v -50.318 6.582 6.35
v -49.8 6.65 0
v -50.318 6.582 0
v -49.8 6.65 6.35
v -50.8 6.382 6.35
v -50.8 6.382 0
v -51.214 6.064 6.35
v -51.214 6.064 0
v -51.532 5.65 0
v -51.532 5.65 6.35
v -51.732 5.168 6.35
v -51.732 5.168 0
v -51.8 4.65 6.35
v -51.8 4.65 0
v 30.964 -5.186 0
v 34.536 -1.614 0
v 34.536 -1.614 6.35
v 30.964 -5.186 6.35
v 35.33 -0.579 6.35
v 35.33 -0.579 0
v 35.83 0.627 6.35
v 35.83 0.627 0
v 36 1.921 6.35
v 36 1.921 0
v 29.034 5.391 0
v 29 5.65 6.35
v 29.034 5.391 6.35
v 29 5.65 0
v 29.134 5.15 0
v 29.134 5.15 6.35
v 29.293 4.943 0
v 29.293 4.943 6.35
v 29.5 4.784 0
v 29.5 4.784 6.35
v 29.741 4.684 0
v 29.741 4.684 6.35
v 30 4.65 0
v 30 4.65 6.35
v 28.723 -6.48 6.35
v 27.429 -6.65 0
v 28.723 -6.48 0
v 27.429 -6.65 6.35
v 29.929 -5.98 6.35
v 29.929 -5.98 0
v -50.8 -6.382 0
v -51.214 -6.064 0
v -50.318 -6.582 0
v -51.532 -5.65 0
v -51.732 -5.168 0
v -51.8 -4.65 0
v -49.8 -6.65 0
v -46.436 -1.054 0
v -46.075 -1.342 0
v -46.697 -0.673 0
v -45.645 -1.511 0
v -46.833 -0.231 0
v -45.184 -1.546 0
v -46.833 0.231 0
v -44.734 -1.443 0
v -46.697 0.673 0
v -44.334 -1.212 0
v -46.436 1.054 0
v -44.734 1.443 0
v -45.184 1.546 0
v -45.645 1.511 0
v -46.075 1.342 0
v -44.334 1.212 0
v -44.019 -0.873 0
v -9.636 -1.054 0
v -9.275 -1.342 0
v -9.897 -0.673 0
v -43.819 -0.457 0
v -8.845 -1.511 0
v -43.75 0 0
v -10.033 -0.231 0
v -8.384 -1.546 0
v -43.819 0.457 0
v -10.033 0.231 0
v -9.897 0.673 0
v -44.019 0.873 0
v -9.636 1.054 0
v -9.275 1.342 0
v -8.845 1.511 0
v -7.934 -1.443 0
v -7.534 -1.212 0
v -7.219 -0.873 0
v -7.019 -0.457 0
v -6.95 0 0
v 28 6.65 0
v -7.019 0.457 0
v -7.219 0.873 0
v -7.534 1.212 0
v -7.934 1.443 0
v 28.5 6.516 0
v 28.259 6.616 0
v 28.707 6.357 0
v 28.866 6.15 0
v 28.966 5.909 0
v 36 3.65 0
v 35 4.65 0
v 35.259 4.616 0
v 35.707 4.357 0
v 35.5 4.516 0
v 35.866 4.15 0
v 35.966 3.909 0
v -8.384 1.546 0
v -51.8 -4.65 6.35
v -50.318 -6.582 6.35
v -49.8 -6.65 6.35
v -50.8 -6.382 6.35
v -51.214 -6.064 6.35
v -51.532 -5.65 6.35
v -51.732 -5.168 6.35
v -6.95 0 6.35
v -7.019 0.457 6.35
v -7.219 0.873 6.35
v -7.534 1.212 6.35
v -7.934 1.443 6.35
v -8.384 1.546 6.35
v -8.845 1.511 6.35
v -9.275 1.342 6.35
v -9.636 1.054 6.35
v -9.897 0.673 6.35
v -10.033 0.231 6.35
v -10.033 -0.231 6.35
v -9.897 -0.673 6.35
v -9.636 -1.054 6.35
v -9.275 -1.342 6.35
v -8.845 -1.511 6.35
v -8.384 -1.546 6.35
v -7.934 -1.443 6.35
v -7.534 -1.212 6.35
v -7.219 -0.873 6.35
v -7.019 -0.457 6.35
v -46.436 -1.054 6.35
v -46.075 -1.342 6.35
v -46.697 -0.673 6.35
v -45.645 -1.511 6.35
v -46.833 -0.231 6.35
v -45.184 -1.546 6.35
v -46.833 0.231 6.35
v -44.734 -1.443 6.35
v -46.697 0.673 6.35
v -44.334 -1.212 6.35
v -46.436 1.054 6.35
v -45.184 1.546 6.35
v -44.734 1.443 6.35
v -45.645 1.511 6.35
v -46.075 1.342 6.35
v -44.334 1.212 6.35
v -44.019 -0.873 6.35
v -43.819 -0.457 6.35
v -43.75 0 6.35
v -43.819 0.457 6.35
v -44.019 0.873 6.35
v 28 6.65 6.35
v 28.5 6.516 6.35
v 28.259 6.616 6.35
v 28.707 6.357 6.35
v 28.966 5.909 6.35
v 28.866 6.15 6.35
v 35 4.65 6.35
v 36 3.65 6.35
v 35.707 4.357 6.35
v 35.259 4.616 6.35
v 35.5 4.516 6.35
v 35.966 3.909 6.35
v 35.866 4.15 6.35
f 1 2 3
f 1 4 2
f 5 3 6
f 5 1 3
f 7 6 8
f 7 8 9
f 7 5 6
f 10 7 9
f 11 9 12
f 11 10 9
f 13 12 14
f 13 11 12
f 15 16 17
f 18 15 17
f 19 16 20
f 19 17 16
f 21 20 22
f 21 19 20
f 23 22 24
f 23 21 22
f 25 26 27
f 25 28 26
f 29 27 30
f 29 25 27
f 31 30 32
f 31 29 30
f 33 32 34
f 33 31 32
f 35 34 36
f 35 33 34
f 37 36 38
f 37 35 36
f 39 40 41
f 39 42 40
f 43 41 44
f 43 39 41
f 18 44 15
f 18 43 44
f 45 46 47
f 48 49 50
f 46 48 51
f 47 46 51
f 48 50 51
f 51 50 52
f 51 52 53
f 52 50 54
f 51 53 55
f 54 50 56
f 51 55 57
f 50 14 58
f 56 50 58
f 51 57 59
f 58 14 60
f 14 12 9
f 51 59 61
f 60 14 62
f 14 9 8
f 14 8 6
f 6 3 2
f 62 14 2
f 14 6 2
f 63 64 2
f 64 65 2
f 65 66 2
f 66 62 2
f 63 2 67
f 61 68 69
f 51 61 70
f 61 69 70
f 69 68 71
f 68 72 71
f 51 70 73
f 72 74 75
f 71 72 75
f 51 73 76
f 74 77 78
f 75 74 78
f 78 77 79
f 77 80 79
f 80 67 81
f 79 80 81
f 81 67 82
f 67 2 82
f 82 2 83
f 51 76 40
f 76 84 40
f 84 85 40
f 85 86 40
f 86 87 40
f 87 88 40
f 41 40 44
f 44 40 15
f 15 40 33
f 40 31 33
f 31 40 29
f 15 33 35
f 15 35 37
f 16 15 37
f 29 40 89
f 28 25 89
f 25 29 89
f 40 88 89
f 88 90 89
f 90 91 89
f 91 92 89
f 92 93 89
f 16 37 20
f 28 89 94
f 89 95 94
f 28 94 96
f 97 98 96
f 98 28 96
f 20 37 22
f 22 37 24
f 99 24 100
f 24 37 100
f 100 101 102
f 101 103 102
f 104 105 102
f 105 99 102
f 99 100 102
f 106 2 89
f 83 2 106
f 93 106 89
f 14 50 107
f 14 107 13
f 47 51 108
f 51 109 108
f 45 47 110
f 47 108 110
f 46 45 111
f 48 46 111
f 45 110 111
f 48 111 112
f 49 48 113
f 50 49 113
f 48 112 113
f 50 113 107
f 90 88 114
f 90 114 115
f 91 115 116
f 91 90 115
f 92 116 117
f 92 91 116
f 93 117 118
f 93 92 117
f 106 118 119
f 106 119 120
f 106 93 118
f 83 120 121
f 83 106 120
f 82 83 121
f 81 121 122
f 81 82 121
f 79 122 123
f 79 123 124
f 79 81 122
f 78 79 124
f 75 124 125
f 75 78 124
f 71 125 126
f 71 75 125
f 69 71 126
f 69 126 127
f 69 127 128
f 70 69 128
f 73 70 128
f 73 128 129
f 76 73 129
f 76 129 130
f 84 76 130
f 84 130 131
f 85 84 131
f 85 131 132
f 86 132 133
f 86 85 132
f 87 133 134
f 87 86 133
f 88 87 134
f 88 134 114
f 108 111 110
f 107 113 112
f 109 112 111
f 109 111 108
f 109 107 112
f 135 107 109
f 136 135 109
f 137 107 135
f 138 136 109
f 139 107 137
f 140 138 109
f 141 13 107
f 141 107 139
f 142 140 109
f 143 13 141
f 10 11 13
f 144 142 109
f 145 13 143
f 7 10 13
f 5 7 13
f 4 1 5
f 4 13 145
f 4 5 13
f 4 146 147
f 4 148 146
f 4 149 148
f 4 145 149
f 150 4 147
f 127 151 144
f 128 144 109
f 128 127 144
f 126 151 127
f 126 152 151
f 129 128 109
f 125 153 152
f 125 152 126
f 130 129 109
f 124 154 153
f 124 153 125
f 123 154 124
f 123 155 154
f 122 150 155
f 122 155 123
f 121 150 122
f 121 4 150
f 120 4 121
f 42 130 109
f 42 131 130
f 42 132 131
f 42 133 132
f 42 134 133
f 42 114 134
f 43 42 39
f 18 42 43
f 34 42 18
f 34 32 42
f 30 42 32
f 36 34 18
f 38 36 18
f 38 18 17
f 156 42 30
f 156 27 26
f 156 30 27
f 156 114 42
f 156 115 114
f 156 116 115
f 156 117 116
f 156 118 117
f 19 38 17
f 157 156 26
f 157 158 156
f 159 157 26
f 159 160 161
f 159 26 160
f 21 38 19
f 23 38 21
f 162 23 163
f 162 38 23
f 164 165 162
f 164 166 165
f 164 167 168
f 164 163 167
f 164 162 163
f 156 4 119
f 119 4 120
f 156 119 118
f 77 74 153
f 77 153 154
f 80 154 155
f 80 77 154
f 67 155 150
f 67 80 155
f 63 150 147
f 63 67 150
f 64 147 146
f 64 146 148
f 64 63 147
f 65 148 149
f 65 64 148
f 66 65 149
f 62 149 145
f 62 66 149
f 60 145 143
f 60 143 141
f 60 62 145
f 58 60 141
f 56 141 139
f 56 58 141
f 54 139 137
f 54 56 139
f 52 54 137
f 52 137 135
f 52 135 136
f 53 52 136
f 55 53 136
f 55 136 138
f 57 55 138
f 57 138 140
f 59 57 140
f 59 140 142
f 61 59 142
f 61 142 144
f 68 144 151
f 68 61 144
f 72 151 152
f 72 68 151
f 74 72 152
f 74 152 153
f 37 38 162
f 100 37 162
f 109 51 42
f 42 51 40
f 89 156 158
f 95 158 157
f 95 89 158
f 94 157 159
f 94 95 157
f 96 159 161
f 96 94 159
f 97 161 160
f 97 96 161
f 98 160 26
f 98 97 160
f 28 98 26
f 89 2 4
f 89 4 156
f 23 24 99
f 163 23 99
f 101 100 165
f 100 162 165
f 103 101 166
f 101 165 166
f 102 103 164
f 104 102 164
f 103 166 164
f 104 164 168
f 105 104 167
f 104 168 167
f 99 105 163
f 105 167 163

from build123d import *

# Parameters (mm, degrees)
SKETCH1_W           = 13.3
SKETCH1_H           = 13.3
SKETCH1_R           = 1.55
SKETCH1_W_2         = 74.5
BOSS_EXTRUDE1_DEPTH = 6.35
FILLET2_R           = 2
CHAMFER1_SIZE       = 6.5
FILLET3_R           = 5
SKETCH2_W           = 7
SKETCH2_H           = 2
CUT_EXTRUDE1_DEPTH  = 53.609742444
FILLET4_R           = 1


with BuildPart() as part:
    # Sketch1 → Boss-Extrude1 (new body)
    # profile 1 of 2: a face of its own
    with BuildSketch(Plane.XY):
        with Locations((-45.15, 0)):
            Rectangle(SKETCH1_W, SKETCH1_H)
        with Locations((-45.3, 0)):
            Circle(SKETCH1_R, mode=Mode.SUBTRACT)
    # profile 2 of 2: a face of its own
    with BuildSketch(Plane.XY):
        with Locations((-1.25, 0)):
            Rectangle(SKETCH1_W_2, SKETCH1_H)
        with Locations((-8.5, 0)):
            Circle(SKETCH1_R, mode=Mode.SUBTRACT)
    extrude(amount=BOSS_EXTRUDE1_DEPTH)

    # Fillet2
    fillet2_edges = [part.edges().sort_by_distance(p)[0] for p in [
        (36, 6.65, 3.175),
        (-51.8, -6.65, 3.175),
        (-51.8, 6.65, 3.175),
    ]]
    fillet(fillet2_edges, radius=FILLET2_R)

    # Chamfer1
    chamfer1_edges = [part.edges().sort_by_distance(p)[0] for p in [
        (36, -6.65, 3.175),
    ]]
    chamfer(chamfer1_edges, length=CHAMFER1_SIZE)

    # Fillet3
    fillet3_edges = [part.edges().sort_by_distance(p)[0] for p in [
        (36, -0.15, 3.175),
        (29.5, -6.65, 3.175),
    ]]
    fillet(fillet3_edges, radius=FILLET3_R)

    # Sketch2 → Cut-Extrude1 (cut, through all)
    with BuildSketch(Plane.XY.offset(6.35)):
        with Locations((32.5, 5.65)):
            Rectangle(SKETCH2_W, SKETCH2_H)
    extrude(amount=-CUT_EXTRUDE1_DEPTH, mode=Mode.SUBTRACT)

    # Fillet4
    fillet4_edges = [part.edges().sort_by_distance(p)[0] for p in [
        (29, 6.65, 3.175),
        (29, 4.65, 3.175),
        (36, 4.65, 3.175),
    ]]
    fillet(fillet4_edges, radius=FILLET4_R - 0.0001)  # a hair under: the kernel refuses the full size


solid = part.part
